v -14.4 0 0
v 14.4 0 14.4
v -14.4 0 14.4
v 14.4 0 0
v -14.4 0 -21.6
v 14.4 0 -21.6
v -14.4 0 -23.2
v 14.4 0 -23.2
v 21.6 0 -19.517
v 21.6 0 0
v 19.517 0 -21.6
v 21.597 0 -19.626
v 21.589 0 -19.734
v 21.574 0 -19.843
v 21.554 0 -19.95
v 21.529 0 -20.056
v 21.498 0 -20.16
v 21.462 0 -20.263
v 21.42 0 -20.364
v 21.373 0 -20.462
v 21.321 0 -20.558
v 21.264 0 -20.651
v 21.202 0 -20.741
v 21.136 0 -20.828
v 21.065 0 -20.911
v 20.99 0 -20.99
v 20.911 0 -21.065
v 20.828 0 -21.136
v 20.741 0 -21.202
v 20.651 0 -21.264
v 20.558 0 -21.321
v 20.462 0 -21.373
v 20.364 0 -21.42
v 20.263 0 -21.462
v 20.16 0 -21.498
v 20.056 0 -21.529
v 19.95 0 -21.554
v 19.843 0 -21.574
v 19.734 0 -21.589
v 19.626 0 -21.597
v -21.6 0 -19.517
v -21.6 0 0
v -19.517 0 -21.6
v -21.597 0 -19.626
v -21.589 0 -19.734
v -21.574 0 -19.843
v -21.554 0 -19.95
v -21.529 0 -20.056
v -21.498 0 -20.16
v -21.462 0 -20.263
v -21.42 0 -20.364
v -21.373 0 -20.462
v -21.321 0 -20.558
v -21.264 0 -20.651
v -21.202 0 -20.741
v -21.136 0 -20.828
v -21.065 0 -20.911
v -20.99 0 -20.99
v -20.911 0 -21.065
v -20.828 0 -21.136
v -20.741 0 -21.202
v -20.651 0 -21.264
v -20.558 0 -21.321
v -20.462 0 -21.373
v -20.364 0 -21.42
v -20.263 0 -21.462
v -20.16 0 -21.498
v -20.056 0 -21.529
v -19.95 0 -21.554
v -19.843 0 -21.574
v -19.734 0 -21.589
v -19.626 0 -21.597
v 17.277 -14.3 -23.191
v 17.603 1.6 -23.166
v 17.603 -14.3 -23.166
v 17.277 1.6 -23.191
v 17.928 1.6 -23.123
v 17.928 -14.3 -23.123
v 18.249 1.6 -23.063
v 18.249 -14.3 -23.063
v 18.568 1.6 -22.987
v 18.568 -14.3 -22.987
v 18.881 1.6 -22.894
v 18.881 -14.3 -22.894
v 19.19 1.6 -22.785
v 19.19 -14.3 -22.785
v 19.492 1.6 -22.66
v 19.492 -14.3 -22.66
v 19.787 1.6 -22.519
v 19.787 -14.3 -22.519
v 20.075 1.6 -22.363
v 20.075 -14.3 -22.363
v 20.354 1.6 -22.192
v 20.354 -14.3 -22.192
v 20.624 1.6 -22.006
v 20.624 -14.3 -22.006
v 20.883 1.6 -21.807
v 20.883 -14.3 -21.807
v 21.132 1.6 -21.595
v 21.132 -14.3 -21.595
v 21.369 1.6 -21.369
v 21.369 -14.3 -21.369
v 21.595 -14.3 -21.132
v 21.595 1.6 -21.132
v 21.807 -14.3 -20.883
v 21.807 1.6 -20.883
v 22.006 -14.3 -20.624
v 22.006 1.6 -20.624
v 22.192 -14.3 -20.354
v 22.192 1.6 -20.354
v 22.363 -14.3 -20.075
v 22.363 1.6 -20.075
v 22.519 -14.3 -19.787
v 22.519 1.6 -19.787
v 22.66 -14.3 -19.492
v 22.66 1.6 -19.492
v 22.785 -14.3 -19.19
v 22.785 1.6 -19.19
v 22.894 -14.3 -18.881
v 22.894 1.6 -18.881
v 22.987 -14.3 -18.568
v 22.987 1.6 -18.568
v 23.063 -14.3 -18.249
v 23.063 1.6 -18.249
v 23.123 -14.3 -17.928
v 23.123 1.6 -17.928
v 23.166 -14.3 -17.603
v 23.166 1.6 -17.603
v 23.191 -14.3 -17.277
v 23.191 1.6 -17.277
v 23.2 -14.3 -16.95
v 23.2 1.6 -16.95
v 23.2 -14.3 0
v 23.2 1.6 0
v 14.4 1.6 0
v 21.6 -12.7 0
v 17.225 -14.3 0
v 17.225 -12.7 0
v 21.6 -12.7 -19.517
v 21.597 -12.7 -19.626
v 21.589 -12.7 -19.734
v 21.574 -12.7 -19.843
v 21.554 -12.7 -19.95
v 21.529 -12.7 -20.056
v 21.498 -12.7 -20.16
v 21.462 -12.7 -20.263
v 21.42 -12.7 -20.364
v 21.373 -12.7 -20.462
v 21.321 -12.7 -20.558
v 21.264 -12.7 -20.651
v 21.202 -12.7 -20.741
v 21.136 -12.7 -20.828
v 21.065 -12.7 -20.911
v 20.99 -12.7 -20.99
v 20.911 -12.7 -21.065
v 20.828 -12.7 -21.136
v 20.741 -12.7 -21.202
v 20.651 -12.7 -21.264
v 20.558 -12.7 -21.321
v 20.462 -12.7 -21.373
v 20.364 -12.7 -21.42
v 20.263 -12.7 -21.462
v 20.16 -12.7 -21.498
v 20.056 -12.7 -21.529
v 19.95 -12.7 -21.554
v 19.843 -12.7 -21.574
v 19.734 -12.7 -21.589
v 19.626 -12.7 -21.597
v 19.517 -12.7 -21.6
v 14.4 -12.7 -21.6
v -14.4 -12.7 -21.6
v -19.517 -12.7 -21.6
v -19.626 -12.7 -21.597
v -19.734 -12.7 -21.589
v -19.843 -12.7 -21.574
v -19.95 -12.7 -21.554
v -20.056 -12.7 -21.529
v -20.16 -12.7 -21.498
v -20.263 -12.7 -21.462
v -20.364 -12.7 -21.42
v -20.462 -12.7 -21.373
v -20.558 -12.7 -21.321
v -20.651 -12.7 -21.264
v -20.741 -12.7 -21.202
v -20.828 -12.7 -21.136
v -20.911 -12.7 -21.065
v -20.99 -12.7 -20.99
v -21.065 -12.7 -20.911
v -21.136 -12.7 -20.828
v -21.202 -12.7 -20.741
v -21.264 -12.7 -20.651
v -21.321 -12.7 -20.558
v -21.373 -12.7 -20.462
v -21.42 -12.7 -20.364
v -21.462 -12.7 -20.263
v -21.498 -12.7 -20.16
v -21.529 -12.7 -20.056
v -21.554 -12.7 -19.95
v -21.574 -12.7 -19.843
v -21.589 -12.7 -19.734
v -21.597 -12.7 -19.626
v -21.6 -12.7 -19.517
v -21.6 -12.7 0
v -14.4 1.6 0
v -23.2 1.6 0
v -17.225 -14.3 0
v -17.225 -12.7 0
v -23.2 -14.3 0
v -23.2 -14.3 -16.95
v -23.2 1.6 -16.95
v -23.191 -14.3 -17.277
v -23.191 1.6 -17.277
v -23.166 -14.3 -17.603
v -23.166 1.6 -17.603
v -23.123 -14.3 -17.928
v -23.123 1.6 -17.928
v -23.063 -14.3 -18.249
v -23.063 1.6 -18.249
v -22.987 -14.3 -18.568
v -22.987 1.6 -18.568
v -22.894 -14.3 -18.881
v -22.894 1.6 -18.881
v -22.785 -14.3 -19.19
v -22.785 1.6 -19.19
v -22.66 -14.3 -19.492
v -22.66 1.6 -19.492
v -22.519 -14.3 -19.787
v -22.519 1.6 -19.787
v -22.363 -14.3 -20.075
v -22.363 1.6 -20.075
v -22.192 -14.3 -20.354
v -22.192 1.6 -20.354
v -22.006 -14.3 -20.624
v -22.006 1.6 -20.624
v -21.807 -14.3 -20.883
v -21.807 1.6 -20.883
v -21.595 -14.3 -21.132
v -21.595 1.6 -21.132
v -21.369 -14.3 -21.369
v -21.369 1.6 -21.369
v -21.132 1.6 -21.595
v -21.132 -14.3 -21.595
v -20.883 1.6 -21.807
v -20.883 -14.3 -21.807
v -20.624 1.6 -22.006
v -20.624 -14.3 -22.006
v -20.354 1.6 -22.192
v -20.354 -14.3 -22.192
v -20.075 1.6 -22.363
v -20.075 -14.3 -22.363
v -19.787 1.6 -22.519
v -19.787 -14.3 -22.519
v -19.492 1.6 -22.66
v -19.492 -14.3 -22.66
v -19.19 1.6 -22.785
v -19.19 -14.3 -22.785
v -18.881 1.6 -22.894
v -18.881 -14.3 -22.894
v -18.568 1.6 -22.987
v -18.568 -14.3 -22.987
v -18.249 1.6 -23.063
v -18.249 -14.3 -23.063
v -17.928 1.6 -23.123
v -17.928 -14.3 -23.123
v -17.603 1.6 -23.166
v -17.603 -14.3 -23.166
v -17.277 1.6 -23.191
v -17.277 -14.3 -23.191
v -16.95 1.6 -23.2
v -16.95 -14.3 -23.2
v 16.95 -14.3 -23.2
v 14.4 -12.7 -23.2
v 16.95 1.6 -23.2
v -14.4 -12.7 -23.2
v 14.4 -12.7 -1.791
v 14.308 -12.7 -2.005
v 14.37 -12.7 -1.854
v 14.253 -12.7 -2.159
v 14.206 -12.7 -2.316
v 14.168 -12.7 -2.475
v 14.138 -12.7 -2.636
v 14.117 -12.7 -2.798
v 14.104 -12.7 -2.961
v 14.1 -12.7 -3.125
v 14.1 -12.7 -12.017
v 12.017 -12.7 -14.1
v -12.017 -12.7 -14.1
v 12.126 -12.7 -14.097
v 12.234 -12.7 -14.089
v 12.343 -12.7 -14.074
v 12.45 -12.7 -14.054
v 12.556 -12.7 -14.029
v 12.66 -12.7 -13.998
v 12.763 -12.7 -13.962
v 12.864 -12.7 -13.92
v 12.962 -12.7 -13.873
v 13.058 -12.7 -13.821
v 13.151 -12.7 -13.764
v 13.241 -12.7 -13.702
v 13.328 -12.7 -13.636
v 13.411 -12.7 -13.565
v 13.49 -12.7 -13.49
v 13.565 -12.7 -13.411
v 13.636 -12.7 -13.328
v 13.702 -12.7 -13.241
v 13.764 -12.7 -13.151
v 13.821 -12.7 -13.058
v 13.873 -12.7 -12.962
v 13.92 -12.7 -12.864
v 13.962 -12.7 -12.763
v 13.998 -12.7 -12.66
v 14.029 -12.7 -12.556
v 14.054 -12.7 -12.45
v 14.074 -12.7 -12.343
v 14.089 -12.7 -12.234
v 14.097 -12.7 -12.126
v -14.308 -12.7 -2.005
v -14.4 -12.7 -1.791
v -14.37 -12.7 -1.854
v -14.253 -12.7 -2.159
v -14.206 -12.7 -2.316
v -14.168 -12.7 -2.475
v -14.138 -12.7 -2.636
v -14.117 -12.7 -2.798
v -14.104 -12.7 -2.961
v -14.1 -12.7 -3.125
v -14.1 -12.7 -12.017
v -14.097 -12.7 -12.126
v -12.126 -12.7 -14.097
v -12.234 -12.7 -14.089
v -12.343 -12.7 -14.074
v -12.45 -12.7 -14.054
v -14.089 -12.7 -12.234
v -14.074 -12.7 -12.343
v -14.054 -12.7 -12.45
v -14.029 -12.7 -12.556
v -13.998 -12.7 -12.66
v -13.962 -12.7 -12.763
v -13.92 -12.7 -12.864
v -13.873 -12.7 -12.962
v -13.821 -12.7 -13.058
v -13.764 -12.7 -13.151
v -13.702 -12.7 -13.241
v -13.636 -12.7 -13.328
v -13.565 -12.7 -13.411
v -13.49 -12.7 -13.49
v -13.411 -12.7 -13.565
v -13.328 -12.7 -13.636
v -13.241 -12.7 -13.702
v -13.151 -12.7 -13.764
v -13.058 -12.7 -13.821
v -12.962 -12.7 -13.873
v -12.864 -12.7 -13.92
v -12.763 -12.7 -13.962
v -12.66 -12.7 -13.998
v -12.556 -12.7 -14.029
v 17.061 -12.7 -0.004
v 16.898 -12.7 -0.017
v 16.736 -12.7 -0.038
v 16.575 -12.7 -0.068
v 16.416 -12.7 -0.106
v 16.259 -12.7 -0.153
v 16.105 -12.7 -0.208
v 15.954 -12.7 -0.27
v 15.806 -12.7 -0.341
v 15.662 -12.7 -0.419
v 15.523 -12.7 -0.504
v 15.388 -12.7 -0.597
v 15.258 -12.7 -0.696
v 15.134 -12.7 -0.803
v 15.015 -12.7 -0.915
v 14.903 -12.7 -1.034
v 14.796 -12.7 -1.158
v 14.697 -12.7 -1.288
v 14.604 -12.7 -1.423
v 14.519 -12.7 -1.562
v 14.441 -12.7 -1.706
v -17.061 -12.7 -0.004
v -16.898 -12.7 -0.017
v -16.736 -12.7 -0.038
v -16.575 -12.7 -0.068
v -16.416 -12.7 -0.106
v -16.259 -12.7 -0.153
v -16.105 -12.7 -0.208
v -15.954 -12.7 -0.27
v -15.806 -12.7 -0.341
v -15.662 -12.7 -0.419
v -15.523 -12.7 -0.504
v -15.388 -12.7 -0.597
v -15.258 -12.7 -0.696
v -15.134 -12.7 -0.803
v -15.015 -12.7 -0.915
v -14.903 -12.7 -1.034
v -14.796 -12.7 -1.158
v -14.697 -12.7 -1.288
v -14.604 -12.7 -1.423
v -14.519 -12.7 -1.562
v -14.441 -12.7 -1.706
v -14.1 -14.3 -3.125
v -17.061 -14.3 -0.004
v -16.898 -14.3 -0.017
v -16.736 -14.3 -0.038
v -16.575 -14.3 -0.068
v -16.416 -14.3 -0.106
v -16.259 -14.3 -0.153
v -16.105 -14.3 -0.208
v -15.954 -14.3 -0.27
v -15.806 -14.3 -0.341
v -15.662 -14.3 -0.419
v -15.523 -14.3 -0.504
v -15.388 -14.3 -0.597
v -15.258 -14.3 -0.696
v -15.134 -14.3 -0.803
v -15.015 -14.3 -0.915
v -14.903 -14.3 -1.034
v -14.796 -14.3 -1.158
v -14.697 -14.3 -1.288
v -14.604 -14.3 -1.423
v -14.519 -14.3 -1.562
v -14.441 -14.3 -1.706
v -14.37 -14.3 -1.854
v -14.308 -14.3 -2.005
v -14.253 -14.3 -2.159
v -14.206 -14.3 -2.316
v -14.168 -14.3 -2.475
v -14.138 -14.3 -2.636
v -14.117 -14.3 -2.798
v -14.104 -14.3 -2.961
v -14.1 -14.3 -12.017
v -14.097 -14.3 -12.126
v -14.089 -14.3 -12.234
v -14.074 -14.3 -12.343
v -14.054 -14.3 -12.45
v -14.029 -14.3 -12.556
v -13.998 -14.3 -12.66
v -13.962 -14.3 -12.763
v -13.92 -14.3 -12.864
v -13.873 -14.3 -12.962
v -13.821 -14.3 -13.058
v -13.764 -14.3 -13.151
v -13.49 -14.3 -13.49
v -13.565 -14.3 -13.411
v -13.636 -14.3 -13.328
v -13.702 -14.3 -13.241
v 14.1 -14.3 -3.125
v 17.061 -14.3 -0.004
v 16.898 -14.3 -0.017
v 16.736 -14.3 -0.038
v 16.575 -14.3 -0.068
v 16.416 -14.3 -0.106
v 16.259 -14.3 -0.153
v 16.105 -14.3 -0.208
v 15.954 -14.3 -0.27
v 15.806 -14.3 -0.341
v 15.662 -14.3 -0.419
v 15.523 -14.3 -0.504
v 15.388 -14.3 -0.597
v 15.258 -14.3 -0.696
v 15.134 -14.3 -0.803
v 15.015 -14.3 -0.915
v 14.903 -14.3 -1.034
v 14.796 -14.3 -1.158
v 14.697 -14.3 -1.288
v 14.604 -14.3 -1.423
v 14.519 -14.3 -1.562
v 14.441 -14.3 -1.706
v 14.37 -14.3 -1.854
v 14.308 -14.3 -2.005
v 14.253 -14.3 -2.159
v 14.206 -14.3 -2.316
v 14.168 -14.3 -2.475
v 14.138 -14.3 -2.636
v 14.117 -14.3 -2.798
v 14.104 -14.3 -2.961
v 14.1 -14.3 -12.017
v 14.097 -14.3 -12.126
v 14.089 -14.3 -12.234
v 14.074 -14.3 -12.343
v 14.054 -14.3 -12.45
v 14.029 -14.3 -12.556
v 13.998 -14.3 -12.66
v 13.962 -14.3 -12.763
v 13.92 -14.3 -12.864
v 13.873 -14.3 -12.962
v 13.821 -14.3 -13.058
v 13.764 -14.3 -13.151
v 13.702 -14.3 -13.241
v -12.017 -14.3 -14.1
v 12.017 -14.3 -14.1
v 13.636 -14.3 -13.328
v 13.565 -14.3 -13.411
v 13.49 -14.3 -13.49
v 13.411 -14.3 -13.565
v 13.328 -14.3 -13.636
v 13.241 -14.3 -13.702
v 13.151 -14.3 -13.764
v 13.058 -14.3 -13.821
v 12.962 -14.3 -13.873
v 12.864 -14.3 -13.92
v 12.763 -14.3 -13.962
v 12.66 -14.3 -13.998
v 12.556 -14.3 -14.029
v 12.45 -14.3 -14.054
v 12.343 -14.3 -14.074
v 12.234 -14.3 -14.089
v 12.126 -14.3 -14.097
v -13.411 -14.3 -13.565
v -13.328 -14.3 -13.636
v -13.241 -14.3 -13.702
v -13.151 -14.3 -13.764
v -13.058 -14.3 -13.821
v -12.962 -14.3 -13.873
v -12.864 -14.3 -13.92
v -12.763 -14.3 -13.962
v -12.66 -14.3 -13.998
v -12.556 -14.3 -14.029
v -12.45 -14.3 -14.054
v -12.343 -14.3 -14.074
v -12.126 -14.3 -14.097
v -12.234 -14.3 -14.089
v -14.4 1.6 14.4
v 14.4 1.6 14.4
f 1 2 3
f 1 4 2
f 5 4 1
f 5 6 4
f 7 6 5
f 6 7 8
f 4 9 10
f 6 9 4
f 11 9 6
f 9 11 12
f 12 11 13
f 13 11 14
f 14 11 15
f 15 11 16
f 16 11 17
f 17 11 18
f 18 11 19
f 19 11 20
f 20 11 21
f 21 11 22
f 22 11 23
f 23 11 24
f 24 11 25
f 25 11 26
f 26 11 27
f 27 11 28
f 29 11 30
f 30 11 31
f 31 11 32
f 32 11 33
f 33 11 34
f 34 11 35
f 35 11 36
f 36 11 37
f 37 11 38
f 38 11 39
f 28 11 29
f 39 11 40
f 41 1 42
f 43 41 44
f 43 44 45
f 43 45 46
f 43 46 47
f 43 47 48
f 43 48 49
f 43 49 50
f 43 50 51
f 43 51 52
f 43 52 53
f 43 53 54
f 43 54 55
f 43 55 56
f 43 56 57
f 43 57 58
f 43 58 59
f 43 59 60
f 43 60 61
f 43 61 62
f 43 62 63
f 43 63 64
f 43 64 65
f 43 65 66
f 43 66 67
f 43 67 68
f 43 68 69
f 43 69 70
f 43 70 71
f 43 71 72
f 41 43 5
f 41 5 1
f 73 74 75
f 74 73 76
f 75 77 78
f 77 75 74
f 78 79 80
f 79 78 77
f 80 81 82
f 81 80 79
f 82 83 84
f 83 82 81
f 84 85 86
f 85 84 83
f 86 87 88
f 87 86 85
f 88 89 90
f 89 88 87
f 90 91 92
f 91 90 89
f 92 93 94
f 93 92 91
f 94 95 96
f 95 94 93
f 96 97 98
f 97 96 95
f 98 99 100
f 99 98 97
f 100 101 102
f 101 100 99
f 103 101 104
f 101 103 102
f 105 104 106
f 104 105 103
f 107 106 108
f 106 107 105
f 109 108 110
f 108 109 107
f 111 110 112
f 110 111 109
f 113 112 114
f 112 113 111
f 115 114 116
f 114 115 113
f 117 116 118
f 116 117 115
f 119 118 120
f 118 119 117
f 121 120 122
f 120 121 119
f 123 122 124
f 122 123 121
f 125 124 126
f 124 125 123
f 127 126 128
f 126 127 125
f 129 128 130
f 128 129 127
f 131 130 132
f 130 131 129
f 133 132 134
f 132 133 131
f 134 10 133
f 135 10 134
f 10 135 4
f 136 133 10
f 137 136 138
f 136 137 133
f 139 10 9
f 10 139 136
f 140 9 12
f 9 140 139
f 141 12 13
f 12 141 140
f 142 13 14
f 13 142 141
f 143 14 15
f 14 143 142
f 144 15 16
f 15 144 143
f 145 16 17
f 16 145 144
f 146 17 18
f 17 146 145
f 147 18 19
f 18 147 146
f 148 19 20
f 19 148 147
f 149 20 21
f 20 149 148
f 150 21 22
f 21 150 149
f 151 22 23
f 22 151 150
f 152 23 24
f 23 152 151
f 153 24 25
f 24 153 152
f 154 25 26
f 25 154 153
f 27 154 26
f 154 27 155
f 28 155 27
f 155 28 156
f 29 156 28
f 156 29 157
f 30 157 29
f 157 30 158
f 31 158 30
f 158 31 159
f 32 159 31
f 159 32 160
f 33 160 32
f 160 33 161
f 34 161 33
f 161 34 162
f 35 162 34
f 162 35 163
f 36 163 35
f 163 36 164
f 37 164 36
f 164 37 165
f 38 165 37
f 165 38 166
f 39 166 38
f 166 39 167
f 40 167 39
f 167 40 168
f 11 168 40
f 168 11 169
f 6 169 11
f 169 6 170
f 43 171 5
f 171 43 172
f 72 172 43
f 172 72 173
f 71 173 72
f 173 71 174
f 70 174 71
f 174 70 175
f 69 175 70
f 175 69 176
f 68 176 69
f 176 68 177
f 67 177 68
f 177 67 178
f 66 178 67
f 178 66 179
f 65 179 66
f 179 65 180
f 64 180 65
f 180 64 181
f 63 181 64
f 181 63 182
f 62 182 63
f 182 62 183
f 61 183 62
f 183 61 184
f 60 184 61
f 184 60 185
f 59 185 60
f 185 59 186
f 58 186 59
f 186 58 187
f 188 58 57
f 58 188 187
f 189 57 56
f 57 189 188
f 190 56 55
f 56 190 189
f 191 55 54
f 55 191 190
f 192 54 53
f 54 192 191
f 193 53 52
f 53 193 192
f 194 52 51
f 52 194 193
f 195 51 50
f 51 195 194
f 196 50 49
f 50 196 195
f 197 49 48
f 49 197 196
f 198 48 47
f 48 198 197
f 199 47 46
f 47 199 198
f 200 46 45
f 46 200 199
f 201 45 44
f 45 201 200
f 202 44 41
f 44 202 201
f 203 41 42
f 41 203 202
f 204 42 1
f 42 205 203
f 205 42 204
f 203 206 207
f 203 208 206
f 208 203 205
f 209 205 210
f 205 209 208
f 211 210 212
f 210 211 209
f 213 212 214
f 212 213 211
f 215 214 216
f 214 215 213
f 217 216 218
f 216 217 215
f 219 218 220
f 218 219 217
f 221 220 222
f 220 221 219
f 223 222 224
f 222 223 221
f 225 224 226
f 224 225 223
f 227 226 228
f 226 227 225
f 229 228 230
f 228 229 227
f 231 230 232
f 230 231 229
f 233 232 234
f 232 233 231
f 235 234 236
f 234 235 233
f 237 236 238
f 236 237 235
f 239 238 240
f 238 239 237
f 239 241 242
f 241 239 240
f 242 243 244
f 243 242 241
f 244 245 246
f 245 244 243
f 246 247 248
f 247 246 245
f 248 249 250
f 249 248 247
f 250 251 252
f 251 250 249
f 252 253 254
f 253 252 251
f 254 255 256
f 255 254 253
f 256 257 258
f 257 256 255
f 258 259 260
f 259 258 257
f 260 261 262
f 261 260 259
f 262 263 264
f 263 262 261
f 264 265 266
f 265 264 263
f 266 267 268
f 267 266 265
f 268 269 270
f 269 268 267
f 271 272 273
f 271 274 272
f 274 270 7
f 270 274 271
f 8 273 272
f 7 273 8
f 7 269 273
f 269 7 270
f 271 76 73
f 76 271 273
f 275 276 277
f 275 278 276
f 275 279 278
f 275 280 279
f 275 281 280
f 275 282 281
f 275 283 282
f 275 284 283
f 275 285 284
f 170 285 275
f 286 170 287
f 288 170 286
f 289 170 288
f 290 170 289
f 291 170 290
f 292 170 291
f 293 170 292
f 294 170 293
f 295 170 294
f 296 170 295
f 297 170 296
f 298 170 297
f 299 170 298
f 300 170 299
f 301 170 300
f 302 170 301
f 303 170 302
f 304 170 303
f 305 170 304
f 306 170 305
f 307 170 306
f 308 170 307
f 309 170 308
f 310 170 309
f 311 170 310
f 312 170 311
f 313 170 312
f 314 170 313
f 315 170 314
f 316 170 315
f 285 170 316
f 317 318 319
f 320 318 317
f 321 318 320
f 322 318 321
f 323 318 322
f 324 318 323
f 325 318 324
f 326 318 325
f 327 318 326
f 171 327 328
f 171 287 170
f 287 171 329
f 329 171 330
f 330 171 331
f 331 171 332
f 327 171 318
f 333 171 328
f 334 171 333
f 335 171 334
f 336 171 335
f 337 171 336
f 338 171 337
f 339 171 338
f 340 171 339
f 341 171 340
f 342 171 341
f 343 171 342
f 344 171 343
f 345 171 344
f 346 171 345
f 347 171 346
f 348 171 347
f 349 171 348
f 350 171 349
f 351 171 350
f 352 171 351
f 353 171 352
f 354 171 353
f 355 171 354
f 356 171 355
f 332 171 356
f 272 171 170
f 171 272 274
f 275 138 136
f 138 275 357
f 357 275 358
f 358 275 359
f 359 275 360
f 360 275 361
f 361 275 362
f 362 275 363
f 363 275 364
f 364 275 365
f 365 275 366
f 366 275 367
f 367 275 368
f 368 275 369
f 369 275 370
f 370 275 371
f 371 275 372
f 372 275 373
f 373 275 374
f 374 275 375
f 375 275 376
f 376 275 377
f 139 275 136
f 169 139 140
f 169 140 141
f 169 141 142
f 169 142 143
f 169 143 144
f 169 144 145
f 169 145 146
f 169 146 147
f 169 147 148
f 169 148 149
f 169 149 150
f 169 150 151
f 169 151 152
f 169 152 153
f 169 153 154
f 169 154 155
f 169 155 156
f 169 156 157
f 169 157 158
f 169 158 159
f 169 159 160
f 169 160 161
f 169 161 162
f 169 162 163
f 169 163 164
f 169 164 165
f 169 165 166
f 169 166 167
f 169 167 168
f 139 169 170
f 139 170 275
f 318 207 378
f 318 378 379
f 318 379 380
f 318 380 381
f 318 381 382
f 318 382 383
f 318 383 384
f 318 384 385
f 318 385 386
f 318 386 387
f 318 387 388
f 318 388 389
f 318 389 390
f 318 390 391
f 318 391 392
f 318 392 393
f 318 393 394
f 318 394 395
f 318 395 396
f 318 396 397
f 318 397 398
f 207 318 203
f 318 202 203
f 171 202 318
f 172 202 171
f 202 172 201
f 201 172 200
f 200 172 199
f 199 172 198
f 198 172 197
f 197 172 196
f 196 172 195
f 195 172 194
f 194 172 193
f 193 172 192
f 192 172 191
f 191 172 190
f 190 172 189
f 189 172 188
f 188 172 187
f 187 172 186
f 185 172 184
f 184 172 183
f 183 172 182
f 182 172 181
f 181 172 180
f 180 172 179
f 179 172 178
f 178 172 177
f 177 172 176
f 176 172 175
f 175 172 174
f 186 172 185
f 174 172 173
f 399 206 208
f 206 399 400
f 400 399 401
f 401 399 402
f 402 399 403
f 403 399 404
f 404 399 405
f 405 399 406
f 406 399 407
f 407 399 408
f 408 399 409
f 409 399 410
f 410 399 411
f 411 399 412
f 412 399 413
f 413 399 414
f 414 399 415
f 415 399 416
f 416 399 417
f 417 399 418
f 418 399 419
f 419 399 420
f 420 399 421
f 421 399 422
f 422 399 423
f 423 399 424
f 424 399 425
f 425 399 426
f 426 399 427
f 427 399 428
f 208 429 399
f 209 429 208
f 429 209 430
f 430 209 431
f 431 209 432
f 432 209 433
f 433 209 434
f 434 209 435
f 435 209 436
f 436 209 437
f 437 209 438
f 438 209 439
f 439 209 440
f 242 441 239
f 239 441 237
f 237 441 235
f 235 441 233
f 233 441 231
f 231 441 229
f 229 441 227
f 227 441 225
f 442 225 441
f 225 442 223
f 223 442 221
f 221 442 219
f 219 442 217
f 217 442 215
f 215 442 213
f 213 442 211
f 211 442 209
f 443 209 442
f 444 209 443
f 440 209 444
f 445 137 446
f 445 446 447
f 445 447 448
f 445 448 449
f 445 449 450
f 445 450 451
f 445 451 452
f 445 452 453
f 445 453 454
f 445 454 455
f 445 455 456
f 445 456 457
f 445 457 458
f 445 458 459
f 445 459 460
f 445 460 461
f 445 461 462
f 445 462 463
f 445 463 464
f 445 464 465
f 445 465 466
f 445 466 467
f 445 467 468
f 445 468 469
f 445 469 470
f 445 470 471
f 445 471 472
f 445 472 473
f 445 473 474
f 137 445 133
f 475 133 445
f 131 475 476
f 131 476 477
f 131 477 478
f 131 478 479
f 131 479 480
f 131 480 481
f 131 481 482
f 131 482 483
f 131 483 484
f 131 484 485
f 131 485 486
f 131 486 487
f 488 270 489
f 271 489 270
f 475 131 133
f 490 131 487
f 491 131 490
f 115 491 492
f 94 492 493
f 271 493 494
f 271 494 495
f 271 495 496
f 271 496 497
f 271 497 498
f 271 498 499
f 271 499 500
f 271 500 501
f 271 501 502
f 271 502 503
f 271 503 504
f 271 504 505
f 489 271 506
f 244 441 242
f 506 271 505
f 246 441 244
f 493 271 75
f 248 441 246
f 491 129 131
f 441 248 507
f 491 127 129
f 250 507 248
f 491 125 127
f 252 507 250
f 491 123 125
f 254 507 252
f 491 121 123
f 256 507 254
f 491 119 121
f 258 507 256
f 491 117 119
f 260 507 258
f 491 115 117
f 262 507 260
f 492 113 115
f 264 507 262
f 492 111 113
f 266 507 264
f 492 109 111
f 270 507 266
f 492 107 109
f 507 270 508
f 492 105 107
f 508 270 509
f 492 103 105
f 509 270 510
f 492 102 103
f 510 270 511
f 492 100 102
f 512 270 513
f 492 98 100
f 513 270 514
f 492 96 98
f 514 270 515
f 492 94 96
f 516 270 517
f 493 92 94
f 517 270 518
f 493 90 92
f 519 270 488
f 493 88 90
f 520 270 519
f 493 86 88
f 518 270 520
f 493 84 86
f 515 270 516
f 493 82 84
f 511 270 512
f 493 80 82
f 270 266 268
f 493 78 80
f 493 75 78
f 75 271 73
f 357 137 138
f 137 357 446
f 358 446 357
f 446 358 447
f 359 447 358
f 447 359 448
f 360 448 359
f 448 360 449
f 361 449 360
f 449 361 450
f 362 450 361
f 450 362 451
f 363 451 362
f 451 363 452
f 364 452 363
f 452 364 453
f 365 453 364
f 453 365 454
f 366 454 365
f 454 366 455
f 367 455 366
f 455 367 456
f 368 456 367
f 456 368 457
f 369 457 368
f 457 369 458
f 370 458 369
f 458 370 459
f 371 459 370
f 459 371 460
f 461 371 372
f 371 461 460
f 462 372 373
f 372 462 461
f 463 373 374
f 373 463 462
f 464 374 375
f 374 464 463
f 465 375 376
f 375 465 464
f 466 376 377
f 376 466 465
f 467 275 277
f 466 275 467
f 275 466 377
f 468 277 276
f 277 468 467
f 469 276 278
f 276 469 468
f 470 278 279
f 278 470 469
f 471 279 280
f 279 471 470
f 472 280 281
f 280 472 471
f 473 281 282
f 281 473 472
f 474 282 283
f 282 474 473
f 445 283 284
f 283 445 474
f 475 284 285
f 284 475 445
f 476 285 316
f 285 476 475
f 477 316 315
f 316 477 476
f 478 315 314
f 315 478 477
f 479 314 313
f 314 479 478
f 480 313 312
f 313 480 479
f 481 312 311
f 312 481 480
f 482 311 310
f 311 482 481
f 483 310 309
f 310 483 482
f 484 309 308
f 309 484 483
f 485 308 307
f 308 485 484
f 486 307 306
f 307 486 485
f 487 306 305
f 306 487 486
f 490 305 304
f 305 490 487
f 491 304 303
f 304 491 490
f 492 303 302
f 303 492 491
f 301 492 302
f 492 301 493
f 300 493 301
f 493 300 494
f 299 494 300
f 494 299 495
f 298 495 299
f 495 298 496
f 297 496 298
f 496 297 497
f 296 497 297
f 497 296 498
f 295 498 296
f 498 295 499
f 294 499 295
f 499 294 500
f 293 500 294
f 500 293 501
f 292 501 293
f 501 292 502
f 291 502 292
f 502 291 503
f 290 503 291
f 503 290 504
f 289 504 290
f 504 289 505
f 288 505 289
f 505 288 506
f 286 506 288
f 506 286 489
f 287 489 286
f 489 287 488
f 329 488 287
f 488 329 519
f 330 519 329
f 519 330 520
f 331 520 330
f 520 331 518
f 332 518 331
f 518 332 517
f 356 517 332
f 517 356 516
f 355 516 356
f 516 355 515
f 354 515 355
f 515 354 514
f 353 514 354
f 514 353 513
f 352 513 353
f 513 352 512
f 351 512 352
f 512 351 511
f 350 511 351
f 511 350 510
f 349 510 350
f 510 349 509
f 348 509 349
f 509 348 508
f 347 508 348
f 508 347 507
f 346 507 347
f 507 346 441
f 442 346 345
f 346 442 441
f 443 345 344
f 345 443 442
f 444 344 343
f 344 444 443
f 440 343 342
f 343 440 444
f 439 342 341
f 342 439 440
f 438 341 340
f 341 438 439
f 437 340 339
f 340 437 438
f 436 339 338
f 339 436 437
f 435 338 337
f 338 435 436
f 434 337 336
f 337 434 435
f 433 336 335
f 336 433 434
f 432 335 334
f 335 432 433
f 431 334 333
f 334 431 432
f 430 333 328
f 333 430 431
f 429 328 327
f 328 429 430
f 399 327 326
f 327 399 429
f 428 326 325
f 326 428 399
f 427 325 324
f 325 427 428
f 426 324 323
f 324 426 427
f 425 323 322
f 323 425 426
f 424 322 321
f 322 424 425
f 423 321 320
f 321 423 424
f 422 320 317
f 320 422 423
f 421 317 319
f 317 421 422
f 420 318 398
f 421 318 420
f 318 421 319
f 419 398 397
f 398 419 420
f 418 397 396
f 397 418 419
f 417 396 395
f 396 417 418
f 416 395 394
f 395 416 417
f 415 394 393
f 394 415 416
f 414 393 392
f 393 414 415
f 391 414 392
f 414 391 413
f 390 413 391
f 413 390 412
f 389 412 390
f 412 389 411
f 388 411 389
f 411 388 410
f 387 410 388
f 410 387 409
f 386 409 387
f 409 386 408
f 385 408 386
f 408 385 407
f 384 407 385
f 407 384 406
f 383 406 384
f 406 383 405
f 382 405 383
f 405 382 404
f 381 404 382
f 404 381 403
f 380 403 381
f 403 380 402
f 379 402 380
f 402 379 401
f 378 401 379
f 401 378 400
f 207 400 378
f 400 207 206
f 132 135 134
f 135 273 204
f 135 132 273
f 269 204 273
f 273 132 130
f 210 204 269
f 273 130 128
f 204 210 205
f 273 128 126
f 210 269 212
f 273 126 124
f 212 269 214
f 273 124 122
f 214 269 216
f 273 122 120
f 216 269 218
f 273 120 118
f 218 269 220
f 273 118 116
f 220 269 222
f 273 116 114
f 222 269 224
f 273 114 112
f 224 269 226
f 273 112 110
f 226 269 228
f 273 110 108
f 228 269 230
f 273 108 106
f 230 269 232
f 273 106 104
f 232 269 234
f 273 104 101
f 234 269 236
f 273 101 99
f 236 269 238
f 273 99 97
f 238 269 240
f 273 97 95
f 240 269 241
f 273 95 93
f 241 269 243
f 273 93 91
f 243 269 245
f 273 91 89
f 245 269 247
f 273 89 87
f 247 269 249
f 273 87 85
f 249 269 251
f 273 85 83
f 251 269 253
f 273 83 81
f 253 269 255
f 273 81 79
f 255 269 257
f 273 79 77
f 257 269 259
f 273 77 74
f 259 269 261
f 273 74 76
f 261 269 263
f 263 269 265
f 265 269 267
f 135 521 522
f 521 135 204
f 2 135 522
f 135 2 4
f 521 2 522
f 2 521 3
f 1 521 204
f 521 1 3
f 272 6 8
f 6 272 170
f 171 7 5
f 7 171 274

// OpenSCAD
// holder for the temperature sensor

include <MCAD/boxes.scad>

box_w  = 43+0.2;
box_h  = 43+0.2;
box_th = 12.5+0.2;
box_r  = 6.25;
border = 7.5;



// work with theme material thickness
m=0.4*4; m2=m*2;

$fn=25;

module front_side(
    n = m,
    b = 0,
    r= box_r
) {
    box_w2 = box_w/2;
    box_h2 = box_h/2;
    // top right
    p1x=box_w2;
    p1y=0;
    // corner 1
    p2x=box_w2;
    p2y=-box_h2;
    // corner 2
    p3x=-box_w2;
    p3y=-box_h2;
    // top left
    p4x=-box_w2;
    p4y=0;
    
    step = 3;
    r2=r/2;
    r3=r/3;

    points_front = concat(
    // top right outside
    [[p1x+n,p1y]],
    // bottom right corner
    [ for(i=[0:step:90]) [
        p2x+n-r+cos(i)*r,
        p2y-n+r-sin(i)*r]],
    // bottom left corner
    [ for(i=[0:step:90]) [
        p3x-n+r-sin(i)*r,
        p3y-n+r-cos(i)*r]],
    // top left outside - inside
    [[p4x-n,p4y]],
    [ for (i=[0:step:90]) [
        p4x+b-min(b,r2-sin(i)*r2),
        p4y-r2+cos(i)*r2]],
    // bottom left corner
    [ for(i=[90:-step:0]) [
        p3x+b+r3-sin(i)*r3,
        p3y+b+r3-cos(i)*r3]],
    // bottom right corner
    [ for(i=[90:-step:0]) [
        p2x-b-r3+cos(i)*r3,
        p2y+b+r3-sin(i)*r3]],
    // top right
    [ for (i=[90:-step:0]) [
        p1x-max(0,b-r2+sin(i)*r2),
        p1y-r2+cos(i)*r2]]
    );
    polygon(points_front);
}



difference() {
    union() {
        // corners are rounded but not the front
        rotate([90,0,0]) {
          height = box_th;
          linear_extrude(height+0.01) front_side(m,0);
          translate([0,0,height])
            linear_extrude(m) front_side(m,border);
          translate([0,0,-m])
            linear_extrude(m) front_side(m,15);
        }
        translate([-box_w/3,0,-box_h/3])
            cube([box_w/3*2,m,box_h/3*2]);
    }
    // hole in the bottom
    translate([-box_w/3,-box_th,-box_h/2-m-0.1])
        cube([box_w/3*2,box_th,box_h+m+0.2]);
}
